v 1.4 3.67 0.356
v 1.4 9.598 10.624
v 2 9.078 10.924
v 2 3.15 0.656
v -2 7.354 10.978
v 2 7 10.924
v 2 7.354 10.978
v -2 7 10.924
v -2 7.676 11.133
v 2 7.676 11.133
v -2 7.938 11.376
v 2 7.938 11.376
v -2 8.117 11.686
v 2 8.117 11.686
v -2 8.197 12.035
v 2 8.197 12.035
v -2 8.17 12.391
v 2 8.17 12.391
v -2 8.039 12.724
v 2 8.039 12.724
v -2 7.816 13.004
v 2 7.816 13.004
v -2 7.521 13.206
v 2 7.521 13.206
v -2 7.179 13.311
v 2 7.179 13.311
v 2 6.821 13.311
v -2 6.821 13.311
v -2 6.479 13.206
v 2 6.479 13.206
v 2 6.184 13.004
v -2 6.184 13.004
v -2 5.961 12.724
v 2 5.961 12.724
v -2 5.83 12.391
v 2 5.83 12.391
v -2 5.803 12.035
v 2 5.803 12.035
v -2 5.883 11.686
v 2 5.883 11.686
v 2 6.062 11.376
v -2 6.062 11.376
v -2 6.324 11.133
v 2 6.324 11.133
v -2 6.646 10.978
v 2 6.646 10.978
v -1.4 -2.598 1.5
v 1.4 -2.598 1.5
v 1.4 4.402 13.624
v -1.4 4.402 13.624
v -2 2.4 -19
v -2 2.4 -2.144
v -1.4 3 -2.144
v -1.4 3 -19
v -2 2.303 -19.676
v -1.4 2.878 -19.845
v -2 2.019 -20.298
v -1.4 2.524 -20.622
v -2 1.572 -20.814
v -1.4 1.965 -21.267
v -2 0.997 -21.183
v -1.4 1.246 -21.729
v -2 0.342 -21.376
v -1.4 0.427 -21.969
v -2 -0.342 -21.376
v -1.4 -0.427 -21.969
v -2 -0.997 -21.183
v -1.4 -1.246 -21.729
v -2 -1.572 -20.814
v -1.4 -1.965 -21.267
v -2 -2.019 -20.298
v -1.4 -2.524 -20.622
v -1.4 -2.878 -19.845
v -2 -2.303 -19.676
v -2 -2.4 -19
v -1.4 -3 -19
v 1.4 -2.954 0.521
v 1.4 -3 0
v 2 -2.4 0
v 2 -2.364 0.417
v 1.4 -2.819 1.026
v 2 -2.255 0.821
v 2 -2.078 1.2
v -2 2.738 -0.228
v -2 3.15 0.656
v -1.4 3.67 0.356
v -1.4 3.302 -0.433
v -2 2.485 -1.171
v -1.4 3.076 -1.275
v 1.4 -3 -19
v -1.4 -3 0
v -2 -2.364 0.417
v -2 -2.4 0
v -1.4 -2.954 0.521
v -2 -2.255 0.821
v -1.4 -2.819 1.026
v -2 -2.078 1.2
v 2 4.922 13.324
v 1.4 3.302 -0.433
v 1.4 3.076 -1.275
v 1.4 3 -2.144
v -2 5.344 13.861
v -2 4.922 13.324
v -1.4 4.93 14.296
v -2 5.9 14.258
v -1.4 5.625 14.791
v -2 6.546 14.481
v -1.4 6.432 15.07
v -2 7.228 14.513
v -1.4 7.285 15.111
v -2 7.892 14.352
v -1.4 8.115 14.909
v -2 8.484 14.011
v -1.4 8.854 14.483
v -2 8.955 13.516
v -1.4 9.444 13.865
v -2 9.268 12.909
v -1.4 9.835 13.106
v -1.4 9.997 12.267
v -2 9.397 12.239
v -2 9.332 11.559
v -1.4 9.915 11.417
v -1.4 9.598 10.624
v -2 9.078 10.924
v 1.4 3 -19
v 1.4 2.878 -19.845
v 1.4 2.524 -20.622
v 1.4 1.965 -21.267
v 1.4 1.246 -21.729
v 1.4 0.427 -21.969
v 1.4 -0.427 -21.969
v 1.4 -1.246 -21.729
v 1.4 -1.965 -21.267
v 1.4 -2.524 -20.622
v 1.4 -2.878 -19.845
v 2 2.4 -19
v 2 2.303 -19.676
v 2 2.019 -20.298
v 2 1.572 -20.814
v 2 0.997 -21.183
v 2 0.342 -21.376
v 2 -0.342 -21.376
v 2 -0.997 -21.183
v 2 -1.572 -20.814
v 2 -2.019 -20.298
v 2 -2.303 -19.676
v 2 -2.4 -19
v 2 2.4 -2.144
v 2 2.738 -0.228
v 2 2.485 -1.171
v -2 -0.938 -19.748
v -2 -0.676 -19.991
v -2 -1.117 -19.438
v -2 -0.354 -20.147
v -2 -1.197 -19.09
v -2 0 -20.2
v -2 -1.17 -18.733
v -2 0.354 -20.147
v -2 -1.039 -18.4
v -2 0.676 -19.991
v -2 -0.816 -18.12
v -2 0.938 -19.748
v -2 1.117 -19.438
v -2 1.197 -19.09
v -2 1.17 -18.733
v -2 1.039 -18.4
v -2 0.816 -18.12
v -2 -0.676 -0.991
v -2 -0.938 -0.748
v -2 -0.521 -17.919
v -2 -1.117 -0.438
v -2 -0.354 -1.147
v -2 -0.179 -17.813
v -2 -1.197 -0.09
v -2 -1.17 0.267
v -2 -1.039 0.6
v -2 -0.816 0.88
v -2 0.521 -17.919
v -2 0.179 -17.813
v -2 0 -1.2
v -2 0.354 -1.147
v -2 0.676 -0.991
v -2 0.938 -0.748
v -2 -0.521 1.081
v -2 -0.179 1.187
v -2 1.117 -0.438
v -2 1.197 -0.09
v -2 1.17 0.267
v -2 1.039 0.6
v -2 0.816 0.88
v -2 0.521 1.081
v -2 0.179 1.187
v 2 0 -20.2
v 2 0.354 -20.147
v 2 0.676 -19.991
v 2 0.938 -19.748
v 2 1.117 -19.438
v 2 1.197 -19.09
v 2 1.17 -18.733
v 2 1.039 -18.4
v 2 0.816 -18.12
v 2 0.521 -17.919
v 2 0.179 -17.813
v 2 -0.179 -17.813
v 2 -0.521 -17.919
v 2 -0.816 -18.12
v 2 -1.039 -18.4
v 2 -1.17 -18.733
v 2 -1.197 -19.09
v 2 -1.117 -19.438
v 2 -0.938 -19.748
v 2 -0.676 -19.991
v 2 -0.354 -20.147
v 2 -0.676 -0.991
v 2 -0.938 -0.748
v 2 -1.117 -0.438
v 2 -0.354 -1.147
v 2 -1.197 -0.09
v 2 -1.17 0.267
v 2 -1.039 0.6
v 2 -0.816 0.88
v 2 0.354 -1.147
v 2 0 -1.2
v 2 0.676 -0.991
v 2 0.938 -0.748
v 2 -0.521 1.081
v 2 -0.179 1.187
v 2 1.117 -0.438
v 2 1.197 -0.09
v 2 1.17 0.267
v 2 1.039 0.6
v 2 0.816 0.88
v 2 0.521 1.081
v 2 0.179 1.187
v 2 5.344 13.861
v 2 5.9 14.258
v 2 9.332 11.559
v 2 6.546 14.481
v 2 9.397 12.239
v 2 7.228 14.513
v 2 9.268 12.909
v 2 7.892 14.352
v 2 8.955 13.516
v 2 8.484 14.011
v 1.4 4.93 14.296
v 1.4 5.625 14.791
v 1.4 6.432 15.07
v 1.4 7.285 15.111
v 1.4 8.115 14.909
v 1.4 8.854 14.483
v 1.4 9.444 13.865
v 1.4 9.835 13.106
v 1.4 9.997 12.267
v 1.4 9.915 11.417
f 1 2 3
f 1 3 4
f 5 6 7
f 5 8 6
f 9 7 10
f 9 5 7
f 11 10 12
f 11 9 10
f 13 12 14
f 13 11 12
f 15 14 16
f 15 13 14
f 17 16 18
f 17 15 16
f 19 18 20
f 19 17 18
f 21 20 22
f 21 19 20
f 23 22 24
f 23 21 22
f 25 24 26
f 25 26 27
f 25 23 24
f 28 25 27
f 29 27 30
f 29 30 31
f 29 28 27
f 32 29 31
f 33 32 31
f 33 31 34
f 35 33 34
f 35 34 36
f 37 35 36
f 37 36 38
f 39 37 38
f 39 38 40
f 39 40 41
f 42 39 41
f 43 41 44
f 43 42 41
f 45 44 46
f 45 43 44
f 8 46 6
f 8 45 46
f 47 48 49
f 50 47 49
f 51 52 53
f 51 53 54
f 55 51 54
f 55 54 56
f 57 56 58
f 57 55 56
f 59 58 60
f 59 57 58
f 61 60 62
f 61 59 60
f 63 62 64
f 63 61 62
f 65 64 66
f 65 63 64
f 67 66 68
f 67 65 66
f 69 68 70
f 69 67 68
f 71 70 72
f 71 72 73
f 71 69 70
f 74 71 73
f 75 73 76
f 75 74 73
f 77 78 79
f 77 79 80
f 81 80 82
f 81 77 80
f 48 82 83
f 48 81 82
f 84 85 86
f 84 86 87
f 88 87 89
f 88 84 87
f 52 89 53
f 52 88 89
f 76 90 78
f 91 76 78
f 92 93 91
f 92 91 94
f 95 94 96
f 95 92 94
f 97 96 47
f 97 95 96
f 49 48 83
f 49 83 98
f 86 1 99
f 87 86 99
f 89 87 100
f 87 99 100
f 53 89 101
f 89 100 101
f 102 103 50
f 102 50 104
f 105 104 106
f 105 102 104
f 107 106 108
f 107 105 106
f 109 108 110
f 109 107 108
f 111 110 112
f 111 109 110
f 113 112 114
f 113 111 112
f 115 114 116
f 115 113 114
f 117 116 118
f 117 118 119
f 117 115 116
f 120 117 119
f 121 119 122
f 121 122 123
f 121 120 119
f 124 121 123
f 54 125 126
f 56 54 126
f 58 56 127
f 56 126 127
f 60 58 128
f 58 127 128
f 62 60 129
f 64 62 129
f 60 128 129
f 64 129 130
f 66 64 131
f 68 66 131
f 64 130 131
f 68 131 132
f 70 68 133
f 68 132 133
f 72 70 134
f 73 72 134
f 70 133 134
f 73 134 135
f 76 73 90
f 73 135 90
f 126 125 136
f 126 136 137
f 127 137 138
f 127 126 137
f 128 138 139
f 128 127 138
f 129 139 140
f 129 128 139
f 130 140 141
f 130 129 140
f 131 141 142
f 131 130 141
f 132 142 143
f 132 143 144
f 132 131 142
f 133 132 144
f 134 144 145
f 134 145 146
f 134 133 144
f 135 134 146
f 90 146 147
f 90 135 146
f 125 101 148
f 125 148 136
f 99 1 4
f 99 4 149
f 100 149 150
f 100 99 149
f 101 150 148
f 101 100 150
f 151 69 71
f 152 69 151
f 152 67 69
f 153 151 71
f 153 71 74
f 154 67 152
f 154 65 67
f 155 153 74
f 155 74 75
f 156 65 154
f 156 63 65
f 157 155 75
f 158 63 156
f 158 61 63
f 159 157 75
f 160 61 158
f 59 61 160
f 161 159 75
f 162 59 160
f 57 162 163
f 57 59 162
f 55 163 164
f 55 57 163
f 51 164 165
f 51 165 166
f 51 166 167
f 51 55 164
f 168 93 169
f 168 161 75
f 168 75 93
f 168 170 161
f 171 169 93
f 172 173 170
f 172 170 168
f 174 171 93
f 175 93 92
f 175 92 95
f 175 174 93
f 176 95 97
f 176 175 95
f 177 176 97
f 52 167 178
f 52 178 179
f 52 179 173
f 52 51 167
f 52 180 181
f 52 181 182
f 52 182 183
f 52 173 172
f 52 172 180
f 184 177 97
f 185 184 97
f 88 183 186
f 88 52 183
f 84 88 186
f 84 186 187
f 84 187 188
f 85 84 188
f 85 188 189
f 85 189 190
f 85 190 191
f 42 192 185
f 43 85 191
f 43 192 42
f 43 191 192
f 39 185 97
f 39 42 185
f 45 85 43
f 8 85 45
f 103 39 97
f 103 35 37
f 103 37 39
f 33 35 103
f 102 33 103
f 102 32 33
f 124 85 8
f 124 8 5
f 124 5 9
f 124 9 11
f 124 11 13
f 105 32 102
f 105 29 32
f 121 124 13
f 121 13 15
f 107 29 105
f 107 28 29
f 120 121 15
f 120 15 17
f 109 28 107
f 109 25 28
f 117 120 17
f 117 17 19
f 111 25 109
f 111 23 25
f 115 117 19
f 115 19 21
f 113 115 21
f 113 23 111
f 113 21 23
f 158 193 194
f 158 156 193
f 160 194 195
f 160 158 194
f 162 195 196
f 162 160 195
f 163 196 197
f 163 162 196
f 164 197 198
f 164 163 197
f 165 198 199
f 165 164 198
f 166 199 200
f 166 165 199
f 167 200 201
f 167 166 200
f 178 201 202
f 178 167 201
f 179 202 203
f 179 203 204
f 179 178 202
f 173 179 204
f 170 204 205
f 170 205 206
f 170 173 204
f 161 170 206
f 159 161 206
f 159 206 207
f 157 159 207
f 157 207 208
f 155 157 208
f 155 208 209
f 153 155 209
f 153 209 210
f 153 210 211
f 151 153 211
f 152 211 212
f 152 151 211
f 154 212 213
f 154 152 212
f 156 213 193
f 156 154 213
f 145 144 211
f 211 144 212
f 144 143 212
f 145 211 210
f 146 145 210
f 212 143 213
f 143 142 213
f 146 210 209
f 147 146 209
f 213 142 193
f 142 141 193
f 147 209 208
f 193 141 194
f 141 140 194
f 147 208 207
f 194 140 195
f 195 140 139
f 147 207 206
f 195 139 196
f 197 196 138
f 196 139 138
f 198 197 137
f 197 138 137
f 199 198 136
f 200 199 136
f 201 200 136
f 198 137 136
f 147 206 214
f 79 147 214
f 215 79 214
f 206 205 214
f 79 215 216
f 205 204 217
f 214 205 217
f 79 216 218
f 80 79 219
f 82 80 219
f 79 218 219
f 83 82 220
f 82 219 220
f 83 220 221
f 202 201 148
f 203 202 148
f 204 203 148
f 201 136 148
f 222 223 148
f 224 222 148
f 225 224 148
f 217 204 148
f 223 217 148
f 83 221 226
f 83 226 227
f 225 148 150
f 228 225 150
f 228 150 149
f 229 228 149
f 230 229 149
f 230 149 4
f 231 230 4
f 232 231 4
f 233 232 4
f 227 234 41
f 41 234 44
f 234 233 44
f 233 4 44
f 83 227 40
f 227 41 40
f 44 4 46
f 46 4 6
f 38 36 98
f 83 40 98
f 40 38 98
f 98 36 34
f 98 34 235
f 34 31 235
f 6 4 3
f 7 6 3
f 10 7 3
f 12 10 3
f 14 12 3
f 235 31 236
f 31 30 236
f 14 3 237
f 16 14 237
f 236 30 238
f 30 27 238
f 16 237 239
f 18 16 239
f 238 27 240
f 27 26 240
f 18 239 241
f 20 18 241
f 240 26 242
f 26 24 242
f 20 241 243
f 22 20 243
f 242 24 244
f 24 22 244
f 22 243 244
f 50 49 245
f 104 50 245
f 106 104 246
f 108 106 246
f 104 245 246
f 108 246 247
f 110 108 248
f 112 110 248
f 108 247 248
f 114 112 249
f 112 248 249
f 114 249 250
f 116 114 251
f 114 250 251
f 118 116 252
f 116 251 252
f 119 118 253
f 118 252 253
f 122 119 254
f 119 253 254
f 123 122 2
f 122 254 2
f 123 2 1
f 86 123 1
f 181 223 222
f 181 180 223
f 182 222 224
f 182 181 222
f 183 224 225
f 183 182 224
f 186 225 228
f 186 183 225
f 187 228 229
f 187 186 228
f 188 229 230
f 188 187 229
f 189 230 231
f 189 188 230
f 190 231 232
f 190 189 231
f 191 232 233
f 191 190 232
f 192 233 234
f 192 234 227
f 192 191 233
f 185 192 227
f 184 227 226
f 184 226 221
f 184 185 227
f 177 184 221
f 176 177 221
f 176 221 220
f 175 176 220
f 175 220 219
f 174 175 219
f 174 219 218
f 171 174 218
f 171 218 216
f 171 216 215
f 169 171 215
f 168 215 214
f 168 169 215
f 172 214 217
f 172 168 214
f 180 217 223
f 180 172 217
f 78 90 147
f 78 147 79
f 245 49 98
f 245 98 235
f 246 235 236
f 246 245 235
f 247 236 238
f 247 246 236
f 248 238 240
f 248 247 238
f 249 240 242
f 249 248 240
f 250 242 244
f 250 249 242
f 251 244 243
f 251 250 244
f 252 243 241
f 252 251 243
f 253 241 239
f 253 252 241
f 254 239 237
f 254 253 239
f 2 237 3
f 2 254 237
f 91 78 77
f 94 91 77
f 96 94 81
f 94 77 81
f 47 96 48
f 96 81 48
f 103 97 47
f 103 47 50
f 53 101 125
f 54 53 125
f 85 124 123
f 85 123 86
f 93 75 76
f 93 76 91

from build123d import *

# Parameters (mm, degrees)
SKETCH_1_R      = 1.2
EXTRUDE_1_DEPTH = 2
FILLET_1_R      = 5
CHAMFER_1_SIZE  = 0.6


with BuildPart() as part:
    # 草图1 → 凸台-拉伸1 (new, symmetric)
    with BuildSketch(Plane(origin=(0, 0, 0), x_dir=(0, 0, -1), z_dir=(1, 0, 0))):
        with BuildLine():
            Line((0, -3), (19, -3))
            ThreePointArc((19, -3), (22, 0), (19, 3))
            Line((19, 3), (0.803847577, 3))
            Line((0.803847577, 3), (-10.624355653, 9.598076211))
            ThreePointArc((-10.624355653, 9.598076211), (-14.722431864, 8.5), (-13.624355653, 4.401923789))
            Line((-13.624355653, 4.401923789), (-1.5, -2.598076211))
            ThreePointArc((-1.5, -2.598076211), (-0.776457135, -2.897777479), (0, -3))
        make_face()
        with Locations((19, 0)):
            Circle(SKETCH_1_R, mode=Mode.SUBTRACT)
        with Locations((-12.124355653, 7)):
            Circle(SKETCH_1_R, mode=Mode.SUBTRACT)
        Circle(SKETCH_1_R, mode=Mode.SUBTRACT)
    extrude(amount=EXTRUDE_1_DEPTH, both=True)

    # 圆角1
    fillet_1_edges = [part.edges().sort_by_distance(p)[0] for p in [
        (0, 3, -0.803847577),
    ]]
    fillet(fillet_1_edges, radius=FILLET_1_R)

    # 倒角1
    chamfer_1_edges = [part.edges().sort_by_distance(p)[0] for p in [
        (-2, 0.901923789, 7.562177826),
        (-2, 8.5, 14.722431864),
        (-2, -2.897777479, 0.776457135),
        (-2, 6.633974596, 5.490381057),
        (-2, -3, -9.5),
        (-2, 3.170370869, -0.849498314),
        (-2, 0, -22),
        (-2, 3, -10.57179677),
        (2, 0.901923789, 7.562177826),
        (2, 8.5, 14.722431864),
        (2, -2.897777479, 0.776457135),
        (2, 6.633974596, 5.490381057),
        (2, -3, -9.5),
        (2, 3.170370869, -0.849498314),
        (2, 0, -22),
        (2, 3, -10.57179677),
    ]]
    chamfer(chamfer_1_edges, length=CHAMFER_1_SIZE)


solid = part.part
